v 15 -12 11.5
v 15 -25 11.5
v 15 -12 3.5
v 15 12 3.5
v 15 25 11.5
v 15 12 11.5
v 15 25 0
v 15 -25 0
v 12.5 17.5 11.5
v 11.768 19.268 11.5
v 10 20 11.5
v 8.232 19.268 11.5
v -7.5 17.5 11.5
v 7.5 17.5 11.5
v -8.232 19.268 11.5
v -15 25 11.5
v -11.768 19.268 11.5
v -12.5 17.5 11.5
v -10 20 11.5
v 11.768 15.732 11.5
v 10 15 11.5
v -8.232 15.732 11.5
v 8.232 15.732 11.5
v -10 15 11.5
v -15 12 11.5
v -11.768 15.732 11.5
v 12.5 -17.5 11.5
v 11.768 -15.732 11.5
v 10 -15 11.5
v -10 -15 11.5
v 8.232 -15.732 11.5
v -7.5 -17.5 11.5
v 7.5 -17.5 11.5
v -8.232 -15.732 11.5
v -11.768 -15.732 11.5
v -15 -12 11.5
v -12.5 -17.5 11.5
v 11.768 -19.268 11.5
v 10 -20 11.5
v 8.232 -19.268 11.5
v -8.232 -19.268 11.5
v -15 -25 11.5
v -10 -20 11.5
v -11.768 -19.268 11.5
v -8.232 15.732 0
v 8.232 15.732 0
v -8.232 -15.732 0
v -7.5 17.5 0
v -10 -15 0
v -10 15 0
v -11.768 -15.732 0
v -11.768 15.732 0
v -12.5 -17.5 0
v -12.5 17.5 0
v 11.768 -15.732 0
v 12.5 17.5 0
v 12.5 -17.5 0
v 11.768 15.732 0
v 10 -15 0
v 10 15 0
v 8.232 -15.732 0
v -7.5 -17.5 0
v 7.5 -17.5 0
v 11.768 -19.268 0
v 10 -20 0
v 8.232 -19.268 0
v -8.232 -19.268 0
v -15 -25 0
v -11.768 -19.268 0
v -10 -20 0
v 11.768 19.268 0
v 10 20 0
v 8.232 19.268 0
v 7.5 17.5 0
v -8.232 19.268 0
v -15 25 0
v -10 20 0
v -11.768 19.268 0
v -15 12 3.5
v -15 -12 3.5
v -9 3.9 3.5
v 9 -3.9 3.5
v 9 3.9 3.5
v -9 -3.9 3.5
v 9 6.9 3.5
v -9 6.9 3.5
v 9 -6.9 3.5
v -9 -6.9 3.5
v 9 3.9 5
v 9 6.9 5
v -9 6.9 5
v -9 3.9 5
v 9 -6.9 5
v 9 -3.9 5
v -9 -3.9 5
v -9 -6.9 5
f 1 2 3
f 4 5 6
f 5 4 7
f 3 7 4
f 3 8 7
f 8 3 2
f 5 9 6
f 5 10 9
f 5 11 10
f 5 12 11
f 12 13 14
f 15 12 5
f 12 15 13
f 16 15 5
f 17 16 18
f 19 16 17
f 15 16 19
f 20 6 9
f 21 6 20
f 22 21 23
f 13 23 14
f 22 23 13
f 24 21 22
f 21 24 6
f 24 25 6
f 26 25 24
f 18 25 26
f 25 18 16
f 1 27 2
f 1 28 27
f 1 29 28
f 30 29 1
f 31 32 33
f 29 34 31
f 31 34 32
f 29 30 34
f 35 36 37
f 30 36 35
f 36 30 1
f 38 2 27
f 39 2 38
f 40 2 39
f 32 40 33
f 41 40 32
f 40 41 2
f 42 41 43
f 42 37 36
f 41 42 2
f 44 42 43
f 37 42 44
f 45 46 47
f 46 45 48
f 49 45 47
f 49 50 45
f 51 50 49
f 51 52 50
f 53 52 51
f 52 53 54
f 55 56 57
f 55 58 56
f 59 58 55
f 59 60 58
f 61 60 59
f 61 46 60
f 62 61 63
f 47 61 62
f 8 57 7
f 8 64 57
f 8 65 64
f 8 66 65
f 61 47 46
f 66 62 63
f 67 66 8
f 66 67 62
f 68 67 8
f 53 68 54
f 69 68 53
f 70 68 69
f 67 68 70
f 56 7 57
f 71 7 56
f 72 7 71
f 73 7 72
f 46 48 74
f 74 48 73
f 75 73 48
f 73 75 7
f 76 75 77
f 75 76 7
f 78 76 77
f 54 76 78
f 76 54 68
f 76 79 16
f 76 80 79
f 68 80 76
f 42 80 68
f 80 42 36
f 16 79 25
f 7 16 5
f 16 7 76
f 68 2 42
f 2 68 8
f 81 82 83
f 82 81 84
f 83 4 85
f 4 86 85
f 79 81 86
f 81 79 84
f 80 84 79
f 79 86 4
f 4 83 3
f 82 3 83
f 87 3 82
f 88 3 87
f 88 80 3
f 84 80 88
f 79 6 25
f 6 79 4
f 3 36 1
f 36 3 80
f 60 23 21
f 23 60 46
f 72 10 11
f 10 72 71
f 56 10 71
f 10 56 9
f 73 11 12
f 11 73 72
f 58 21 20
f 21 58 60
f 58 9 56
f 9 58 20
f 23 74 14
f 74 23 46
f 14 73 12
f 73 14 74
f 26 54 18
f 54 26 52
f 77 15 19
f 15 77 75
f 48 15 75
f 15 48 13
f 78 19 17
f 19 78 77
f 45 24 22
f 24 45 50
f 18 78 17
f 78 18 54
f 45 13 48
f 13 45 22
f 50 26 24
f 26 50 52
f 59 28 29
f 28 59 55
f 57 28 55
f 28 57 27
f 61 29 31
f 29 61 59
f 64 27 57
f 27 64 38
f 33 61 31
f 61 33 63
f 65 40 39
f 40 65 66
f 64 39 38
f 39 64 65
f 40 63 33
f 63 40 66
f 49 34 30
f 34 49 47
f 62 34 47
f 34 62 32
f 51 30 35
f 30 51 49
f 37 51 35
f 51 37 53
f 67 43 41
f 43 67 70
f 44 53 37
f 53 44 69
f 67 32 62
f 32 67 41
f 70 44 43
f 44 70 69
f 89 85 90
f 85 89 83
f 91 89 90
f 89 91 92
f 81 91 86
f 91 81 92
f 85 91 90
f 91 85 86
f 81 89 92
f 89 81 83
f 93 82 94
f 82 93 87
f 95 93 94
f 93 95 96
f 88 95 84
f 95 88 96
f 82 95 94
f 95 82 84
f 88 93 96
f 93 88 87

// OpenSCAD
difference()
{
    translate([0,0,11.5]/2) cube ([30,50,11.5],center=true);
    translate([0,0,50]/2 + [0,0,11.5 - 8]) cube([40,24,50],center=true);


translate([20,35,0]/2) cylinder(d=5, h=50,  center=true);
translate([-20,35,0]/2) cylinder(d=5, h=50,  center=true);
    translate([20,-35,0]/2) cylinder(d=5, h=50,  center=true);
    translate([-20,-35,0]/2) cylinder(d=5, h=50,  center=true);
  
}
translate([0,(6.8+4)/2,11.5-8]) cube([18,3,3],center=true);
translate([0,-(6.8+4)/2,11.5-8]) cube([18,3,3],center=true);
